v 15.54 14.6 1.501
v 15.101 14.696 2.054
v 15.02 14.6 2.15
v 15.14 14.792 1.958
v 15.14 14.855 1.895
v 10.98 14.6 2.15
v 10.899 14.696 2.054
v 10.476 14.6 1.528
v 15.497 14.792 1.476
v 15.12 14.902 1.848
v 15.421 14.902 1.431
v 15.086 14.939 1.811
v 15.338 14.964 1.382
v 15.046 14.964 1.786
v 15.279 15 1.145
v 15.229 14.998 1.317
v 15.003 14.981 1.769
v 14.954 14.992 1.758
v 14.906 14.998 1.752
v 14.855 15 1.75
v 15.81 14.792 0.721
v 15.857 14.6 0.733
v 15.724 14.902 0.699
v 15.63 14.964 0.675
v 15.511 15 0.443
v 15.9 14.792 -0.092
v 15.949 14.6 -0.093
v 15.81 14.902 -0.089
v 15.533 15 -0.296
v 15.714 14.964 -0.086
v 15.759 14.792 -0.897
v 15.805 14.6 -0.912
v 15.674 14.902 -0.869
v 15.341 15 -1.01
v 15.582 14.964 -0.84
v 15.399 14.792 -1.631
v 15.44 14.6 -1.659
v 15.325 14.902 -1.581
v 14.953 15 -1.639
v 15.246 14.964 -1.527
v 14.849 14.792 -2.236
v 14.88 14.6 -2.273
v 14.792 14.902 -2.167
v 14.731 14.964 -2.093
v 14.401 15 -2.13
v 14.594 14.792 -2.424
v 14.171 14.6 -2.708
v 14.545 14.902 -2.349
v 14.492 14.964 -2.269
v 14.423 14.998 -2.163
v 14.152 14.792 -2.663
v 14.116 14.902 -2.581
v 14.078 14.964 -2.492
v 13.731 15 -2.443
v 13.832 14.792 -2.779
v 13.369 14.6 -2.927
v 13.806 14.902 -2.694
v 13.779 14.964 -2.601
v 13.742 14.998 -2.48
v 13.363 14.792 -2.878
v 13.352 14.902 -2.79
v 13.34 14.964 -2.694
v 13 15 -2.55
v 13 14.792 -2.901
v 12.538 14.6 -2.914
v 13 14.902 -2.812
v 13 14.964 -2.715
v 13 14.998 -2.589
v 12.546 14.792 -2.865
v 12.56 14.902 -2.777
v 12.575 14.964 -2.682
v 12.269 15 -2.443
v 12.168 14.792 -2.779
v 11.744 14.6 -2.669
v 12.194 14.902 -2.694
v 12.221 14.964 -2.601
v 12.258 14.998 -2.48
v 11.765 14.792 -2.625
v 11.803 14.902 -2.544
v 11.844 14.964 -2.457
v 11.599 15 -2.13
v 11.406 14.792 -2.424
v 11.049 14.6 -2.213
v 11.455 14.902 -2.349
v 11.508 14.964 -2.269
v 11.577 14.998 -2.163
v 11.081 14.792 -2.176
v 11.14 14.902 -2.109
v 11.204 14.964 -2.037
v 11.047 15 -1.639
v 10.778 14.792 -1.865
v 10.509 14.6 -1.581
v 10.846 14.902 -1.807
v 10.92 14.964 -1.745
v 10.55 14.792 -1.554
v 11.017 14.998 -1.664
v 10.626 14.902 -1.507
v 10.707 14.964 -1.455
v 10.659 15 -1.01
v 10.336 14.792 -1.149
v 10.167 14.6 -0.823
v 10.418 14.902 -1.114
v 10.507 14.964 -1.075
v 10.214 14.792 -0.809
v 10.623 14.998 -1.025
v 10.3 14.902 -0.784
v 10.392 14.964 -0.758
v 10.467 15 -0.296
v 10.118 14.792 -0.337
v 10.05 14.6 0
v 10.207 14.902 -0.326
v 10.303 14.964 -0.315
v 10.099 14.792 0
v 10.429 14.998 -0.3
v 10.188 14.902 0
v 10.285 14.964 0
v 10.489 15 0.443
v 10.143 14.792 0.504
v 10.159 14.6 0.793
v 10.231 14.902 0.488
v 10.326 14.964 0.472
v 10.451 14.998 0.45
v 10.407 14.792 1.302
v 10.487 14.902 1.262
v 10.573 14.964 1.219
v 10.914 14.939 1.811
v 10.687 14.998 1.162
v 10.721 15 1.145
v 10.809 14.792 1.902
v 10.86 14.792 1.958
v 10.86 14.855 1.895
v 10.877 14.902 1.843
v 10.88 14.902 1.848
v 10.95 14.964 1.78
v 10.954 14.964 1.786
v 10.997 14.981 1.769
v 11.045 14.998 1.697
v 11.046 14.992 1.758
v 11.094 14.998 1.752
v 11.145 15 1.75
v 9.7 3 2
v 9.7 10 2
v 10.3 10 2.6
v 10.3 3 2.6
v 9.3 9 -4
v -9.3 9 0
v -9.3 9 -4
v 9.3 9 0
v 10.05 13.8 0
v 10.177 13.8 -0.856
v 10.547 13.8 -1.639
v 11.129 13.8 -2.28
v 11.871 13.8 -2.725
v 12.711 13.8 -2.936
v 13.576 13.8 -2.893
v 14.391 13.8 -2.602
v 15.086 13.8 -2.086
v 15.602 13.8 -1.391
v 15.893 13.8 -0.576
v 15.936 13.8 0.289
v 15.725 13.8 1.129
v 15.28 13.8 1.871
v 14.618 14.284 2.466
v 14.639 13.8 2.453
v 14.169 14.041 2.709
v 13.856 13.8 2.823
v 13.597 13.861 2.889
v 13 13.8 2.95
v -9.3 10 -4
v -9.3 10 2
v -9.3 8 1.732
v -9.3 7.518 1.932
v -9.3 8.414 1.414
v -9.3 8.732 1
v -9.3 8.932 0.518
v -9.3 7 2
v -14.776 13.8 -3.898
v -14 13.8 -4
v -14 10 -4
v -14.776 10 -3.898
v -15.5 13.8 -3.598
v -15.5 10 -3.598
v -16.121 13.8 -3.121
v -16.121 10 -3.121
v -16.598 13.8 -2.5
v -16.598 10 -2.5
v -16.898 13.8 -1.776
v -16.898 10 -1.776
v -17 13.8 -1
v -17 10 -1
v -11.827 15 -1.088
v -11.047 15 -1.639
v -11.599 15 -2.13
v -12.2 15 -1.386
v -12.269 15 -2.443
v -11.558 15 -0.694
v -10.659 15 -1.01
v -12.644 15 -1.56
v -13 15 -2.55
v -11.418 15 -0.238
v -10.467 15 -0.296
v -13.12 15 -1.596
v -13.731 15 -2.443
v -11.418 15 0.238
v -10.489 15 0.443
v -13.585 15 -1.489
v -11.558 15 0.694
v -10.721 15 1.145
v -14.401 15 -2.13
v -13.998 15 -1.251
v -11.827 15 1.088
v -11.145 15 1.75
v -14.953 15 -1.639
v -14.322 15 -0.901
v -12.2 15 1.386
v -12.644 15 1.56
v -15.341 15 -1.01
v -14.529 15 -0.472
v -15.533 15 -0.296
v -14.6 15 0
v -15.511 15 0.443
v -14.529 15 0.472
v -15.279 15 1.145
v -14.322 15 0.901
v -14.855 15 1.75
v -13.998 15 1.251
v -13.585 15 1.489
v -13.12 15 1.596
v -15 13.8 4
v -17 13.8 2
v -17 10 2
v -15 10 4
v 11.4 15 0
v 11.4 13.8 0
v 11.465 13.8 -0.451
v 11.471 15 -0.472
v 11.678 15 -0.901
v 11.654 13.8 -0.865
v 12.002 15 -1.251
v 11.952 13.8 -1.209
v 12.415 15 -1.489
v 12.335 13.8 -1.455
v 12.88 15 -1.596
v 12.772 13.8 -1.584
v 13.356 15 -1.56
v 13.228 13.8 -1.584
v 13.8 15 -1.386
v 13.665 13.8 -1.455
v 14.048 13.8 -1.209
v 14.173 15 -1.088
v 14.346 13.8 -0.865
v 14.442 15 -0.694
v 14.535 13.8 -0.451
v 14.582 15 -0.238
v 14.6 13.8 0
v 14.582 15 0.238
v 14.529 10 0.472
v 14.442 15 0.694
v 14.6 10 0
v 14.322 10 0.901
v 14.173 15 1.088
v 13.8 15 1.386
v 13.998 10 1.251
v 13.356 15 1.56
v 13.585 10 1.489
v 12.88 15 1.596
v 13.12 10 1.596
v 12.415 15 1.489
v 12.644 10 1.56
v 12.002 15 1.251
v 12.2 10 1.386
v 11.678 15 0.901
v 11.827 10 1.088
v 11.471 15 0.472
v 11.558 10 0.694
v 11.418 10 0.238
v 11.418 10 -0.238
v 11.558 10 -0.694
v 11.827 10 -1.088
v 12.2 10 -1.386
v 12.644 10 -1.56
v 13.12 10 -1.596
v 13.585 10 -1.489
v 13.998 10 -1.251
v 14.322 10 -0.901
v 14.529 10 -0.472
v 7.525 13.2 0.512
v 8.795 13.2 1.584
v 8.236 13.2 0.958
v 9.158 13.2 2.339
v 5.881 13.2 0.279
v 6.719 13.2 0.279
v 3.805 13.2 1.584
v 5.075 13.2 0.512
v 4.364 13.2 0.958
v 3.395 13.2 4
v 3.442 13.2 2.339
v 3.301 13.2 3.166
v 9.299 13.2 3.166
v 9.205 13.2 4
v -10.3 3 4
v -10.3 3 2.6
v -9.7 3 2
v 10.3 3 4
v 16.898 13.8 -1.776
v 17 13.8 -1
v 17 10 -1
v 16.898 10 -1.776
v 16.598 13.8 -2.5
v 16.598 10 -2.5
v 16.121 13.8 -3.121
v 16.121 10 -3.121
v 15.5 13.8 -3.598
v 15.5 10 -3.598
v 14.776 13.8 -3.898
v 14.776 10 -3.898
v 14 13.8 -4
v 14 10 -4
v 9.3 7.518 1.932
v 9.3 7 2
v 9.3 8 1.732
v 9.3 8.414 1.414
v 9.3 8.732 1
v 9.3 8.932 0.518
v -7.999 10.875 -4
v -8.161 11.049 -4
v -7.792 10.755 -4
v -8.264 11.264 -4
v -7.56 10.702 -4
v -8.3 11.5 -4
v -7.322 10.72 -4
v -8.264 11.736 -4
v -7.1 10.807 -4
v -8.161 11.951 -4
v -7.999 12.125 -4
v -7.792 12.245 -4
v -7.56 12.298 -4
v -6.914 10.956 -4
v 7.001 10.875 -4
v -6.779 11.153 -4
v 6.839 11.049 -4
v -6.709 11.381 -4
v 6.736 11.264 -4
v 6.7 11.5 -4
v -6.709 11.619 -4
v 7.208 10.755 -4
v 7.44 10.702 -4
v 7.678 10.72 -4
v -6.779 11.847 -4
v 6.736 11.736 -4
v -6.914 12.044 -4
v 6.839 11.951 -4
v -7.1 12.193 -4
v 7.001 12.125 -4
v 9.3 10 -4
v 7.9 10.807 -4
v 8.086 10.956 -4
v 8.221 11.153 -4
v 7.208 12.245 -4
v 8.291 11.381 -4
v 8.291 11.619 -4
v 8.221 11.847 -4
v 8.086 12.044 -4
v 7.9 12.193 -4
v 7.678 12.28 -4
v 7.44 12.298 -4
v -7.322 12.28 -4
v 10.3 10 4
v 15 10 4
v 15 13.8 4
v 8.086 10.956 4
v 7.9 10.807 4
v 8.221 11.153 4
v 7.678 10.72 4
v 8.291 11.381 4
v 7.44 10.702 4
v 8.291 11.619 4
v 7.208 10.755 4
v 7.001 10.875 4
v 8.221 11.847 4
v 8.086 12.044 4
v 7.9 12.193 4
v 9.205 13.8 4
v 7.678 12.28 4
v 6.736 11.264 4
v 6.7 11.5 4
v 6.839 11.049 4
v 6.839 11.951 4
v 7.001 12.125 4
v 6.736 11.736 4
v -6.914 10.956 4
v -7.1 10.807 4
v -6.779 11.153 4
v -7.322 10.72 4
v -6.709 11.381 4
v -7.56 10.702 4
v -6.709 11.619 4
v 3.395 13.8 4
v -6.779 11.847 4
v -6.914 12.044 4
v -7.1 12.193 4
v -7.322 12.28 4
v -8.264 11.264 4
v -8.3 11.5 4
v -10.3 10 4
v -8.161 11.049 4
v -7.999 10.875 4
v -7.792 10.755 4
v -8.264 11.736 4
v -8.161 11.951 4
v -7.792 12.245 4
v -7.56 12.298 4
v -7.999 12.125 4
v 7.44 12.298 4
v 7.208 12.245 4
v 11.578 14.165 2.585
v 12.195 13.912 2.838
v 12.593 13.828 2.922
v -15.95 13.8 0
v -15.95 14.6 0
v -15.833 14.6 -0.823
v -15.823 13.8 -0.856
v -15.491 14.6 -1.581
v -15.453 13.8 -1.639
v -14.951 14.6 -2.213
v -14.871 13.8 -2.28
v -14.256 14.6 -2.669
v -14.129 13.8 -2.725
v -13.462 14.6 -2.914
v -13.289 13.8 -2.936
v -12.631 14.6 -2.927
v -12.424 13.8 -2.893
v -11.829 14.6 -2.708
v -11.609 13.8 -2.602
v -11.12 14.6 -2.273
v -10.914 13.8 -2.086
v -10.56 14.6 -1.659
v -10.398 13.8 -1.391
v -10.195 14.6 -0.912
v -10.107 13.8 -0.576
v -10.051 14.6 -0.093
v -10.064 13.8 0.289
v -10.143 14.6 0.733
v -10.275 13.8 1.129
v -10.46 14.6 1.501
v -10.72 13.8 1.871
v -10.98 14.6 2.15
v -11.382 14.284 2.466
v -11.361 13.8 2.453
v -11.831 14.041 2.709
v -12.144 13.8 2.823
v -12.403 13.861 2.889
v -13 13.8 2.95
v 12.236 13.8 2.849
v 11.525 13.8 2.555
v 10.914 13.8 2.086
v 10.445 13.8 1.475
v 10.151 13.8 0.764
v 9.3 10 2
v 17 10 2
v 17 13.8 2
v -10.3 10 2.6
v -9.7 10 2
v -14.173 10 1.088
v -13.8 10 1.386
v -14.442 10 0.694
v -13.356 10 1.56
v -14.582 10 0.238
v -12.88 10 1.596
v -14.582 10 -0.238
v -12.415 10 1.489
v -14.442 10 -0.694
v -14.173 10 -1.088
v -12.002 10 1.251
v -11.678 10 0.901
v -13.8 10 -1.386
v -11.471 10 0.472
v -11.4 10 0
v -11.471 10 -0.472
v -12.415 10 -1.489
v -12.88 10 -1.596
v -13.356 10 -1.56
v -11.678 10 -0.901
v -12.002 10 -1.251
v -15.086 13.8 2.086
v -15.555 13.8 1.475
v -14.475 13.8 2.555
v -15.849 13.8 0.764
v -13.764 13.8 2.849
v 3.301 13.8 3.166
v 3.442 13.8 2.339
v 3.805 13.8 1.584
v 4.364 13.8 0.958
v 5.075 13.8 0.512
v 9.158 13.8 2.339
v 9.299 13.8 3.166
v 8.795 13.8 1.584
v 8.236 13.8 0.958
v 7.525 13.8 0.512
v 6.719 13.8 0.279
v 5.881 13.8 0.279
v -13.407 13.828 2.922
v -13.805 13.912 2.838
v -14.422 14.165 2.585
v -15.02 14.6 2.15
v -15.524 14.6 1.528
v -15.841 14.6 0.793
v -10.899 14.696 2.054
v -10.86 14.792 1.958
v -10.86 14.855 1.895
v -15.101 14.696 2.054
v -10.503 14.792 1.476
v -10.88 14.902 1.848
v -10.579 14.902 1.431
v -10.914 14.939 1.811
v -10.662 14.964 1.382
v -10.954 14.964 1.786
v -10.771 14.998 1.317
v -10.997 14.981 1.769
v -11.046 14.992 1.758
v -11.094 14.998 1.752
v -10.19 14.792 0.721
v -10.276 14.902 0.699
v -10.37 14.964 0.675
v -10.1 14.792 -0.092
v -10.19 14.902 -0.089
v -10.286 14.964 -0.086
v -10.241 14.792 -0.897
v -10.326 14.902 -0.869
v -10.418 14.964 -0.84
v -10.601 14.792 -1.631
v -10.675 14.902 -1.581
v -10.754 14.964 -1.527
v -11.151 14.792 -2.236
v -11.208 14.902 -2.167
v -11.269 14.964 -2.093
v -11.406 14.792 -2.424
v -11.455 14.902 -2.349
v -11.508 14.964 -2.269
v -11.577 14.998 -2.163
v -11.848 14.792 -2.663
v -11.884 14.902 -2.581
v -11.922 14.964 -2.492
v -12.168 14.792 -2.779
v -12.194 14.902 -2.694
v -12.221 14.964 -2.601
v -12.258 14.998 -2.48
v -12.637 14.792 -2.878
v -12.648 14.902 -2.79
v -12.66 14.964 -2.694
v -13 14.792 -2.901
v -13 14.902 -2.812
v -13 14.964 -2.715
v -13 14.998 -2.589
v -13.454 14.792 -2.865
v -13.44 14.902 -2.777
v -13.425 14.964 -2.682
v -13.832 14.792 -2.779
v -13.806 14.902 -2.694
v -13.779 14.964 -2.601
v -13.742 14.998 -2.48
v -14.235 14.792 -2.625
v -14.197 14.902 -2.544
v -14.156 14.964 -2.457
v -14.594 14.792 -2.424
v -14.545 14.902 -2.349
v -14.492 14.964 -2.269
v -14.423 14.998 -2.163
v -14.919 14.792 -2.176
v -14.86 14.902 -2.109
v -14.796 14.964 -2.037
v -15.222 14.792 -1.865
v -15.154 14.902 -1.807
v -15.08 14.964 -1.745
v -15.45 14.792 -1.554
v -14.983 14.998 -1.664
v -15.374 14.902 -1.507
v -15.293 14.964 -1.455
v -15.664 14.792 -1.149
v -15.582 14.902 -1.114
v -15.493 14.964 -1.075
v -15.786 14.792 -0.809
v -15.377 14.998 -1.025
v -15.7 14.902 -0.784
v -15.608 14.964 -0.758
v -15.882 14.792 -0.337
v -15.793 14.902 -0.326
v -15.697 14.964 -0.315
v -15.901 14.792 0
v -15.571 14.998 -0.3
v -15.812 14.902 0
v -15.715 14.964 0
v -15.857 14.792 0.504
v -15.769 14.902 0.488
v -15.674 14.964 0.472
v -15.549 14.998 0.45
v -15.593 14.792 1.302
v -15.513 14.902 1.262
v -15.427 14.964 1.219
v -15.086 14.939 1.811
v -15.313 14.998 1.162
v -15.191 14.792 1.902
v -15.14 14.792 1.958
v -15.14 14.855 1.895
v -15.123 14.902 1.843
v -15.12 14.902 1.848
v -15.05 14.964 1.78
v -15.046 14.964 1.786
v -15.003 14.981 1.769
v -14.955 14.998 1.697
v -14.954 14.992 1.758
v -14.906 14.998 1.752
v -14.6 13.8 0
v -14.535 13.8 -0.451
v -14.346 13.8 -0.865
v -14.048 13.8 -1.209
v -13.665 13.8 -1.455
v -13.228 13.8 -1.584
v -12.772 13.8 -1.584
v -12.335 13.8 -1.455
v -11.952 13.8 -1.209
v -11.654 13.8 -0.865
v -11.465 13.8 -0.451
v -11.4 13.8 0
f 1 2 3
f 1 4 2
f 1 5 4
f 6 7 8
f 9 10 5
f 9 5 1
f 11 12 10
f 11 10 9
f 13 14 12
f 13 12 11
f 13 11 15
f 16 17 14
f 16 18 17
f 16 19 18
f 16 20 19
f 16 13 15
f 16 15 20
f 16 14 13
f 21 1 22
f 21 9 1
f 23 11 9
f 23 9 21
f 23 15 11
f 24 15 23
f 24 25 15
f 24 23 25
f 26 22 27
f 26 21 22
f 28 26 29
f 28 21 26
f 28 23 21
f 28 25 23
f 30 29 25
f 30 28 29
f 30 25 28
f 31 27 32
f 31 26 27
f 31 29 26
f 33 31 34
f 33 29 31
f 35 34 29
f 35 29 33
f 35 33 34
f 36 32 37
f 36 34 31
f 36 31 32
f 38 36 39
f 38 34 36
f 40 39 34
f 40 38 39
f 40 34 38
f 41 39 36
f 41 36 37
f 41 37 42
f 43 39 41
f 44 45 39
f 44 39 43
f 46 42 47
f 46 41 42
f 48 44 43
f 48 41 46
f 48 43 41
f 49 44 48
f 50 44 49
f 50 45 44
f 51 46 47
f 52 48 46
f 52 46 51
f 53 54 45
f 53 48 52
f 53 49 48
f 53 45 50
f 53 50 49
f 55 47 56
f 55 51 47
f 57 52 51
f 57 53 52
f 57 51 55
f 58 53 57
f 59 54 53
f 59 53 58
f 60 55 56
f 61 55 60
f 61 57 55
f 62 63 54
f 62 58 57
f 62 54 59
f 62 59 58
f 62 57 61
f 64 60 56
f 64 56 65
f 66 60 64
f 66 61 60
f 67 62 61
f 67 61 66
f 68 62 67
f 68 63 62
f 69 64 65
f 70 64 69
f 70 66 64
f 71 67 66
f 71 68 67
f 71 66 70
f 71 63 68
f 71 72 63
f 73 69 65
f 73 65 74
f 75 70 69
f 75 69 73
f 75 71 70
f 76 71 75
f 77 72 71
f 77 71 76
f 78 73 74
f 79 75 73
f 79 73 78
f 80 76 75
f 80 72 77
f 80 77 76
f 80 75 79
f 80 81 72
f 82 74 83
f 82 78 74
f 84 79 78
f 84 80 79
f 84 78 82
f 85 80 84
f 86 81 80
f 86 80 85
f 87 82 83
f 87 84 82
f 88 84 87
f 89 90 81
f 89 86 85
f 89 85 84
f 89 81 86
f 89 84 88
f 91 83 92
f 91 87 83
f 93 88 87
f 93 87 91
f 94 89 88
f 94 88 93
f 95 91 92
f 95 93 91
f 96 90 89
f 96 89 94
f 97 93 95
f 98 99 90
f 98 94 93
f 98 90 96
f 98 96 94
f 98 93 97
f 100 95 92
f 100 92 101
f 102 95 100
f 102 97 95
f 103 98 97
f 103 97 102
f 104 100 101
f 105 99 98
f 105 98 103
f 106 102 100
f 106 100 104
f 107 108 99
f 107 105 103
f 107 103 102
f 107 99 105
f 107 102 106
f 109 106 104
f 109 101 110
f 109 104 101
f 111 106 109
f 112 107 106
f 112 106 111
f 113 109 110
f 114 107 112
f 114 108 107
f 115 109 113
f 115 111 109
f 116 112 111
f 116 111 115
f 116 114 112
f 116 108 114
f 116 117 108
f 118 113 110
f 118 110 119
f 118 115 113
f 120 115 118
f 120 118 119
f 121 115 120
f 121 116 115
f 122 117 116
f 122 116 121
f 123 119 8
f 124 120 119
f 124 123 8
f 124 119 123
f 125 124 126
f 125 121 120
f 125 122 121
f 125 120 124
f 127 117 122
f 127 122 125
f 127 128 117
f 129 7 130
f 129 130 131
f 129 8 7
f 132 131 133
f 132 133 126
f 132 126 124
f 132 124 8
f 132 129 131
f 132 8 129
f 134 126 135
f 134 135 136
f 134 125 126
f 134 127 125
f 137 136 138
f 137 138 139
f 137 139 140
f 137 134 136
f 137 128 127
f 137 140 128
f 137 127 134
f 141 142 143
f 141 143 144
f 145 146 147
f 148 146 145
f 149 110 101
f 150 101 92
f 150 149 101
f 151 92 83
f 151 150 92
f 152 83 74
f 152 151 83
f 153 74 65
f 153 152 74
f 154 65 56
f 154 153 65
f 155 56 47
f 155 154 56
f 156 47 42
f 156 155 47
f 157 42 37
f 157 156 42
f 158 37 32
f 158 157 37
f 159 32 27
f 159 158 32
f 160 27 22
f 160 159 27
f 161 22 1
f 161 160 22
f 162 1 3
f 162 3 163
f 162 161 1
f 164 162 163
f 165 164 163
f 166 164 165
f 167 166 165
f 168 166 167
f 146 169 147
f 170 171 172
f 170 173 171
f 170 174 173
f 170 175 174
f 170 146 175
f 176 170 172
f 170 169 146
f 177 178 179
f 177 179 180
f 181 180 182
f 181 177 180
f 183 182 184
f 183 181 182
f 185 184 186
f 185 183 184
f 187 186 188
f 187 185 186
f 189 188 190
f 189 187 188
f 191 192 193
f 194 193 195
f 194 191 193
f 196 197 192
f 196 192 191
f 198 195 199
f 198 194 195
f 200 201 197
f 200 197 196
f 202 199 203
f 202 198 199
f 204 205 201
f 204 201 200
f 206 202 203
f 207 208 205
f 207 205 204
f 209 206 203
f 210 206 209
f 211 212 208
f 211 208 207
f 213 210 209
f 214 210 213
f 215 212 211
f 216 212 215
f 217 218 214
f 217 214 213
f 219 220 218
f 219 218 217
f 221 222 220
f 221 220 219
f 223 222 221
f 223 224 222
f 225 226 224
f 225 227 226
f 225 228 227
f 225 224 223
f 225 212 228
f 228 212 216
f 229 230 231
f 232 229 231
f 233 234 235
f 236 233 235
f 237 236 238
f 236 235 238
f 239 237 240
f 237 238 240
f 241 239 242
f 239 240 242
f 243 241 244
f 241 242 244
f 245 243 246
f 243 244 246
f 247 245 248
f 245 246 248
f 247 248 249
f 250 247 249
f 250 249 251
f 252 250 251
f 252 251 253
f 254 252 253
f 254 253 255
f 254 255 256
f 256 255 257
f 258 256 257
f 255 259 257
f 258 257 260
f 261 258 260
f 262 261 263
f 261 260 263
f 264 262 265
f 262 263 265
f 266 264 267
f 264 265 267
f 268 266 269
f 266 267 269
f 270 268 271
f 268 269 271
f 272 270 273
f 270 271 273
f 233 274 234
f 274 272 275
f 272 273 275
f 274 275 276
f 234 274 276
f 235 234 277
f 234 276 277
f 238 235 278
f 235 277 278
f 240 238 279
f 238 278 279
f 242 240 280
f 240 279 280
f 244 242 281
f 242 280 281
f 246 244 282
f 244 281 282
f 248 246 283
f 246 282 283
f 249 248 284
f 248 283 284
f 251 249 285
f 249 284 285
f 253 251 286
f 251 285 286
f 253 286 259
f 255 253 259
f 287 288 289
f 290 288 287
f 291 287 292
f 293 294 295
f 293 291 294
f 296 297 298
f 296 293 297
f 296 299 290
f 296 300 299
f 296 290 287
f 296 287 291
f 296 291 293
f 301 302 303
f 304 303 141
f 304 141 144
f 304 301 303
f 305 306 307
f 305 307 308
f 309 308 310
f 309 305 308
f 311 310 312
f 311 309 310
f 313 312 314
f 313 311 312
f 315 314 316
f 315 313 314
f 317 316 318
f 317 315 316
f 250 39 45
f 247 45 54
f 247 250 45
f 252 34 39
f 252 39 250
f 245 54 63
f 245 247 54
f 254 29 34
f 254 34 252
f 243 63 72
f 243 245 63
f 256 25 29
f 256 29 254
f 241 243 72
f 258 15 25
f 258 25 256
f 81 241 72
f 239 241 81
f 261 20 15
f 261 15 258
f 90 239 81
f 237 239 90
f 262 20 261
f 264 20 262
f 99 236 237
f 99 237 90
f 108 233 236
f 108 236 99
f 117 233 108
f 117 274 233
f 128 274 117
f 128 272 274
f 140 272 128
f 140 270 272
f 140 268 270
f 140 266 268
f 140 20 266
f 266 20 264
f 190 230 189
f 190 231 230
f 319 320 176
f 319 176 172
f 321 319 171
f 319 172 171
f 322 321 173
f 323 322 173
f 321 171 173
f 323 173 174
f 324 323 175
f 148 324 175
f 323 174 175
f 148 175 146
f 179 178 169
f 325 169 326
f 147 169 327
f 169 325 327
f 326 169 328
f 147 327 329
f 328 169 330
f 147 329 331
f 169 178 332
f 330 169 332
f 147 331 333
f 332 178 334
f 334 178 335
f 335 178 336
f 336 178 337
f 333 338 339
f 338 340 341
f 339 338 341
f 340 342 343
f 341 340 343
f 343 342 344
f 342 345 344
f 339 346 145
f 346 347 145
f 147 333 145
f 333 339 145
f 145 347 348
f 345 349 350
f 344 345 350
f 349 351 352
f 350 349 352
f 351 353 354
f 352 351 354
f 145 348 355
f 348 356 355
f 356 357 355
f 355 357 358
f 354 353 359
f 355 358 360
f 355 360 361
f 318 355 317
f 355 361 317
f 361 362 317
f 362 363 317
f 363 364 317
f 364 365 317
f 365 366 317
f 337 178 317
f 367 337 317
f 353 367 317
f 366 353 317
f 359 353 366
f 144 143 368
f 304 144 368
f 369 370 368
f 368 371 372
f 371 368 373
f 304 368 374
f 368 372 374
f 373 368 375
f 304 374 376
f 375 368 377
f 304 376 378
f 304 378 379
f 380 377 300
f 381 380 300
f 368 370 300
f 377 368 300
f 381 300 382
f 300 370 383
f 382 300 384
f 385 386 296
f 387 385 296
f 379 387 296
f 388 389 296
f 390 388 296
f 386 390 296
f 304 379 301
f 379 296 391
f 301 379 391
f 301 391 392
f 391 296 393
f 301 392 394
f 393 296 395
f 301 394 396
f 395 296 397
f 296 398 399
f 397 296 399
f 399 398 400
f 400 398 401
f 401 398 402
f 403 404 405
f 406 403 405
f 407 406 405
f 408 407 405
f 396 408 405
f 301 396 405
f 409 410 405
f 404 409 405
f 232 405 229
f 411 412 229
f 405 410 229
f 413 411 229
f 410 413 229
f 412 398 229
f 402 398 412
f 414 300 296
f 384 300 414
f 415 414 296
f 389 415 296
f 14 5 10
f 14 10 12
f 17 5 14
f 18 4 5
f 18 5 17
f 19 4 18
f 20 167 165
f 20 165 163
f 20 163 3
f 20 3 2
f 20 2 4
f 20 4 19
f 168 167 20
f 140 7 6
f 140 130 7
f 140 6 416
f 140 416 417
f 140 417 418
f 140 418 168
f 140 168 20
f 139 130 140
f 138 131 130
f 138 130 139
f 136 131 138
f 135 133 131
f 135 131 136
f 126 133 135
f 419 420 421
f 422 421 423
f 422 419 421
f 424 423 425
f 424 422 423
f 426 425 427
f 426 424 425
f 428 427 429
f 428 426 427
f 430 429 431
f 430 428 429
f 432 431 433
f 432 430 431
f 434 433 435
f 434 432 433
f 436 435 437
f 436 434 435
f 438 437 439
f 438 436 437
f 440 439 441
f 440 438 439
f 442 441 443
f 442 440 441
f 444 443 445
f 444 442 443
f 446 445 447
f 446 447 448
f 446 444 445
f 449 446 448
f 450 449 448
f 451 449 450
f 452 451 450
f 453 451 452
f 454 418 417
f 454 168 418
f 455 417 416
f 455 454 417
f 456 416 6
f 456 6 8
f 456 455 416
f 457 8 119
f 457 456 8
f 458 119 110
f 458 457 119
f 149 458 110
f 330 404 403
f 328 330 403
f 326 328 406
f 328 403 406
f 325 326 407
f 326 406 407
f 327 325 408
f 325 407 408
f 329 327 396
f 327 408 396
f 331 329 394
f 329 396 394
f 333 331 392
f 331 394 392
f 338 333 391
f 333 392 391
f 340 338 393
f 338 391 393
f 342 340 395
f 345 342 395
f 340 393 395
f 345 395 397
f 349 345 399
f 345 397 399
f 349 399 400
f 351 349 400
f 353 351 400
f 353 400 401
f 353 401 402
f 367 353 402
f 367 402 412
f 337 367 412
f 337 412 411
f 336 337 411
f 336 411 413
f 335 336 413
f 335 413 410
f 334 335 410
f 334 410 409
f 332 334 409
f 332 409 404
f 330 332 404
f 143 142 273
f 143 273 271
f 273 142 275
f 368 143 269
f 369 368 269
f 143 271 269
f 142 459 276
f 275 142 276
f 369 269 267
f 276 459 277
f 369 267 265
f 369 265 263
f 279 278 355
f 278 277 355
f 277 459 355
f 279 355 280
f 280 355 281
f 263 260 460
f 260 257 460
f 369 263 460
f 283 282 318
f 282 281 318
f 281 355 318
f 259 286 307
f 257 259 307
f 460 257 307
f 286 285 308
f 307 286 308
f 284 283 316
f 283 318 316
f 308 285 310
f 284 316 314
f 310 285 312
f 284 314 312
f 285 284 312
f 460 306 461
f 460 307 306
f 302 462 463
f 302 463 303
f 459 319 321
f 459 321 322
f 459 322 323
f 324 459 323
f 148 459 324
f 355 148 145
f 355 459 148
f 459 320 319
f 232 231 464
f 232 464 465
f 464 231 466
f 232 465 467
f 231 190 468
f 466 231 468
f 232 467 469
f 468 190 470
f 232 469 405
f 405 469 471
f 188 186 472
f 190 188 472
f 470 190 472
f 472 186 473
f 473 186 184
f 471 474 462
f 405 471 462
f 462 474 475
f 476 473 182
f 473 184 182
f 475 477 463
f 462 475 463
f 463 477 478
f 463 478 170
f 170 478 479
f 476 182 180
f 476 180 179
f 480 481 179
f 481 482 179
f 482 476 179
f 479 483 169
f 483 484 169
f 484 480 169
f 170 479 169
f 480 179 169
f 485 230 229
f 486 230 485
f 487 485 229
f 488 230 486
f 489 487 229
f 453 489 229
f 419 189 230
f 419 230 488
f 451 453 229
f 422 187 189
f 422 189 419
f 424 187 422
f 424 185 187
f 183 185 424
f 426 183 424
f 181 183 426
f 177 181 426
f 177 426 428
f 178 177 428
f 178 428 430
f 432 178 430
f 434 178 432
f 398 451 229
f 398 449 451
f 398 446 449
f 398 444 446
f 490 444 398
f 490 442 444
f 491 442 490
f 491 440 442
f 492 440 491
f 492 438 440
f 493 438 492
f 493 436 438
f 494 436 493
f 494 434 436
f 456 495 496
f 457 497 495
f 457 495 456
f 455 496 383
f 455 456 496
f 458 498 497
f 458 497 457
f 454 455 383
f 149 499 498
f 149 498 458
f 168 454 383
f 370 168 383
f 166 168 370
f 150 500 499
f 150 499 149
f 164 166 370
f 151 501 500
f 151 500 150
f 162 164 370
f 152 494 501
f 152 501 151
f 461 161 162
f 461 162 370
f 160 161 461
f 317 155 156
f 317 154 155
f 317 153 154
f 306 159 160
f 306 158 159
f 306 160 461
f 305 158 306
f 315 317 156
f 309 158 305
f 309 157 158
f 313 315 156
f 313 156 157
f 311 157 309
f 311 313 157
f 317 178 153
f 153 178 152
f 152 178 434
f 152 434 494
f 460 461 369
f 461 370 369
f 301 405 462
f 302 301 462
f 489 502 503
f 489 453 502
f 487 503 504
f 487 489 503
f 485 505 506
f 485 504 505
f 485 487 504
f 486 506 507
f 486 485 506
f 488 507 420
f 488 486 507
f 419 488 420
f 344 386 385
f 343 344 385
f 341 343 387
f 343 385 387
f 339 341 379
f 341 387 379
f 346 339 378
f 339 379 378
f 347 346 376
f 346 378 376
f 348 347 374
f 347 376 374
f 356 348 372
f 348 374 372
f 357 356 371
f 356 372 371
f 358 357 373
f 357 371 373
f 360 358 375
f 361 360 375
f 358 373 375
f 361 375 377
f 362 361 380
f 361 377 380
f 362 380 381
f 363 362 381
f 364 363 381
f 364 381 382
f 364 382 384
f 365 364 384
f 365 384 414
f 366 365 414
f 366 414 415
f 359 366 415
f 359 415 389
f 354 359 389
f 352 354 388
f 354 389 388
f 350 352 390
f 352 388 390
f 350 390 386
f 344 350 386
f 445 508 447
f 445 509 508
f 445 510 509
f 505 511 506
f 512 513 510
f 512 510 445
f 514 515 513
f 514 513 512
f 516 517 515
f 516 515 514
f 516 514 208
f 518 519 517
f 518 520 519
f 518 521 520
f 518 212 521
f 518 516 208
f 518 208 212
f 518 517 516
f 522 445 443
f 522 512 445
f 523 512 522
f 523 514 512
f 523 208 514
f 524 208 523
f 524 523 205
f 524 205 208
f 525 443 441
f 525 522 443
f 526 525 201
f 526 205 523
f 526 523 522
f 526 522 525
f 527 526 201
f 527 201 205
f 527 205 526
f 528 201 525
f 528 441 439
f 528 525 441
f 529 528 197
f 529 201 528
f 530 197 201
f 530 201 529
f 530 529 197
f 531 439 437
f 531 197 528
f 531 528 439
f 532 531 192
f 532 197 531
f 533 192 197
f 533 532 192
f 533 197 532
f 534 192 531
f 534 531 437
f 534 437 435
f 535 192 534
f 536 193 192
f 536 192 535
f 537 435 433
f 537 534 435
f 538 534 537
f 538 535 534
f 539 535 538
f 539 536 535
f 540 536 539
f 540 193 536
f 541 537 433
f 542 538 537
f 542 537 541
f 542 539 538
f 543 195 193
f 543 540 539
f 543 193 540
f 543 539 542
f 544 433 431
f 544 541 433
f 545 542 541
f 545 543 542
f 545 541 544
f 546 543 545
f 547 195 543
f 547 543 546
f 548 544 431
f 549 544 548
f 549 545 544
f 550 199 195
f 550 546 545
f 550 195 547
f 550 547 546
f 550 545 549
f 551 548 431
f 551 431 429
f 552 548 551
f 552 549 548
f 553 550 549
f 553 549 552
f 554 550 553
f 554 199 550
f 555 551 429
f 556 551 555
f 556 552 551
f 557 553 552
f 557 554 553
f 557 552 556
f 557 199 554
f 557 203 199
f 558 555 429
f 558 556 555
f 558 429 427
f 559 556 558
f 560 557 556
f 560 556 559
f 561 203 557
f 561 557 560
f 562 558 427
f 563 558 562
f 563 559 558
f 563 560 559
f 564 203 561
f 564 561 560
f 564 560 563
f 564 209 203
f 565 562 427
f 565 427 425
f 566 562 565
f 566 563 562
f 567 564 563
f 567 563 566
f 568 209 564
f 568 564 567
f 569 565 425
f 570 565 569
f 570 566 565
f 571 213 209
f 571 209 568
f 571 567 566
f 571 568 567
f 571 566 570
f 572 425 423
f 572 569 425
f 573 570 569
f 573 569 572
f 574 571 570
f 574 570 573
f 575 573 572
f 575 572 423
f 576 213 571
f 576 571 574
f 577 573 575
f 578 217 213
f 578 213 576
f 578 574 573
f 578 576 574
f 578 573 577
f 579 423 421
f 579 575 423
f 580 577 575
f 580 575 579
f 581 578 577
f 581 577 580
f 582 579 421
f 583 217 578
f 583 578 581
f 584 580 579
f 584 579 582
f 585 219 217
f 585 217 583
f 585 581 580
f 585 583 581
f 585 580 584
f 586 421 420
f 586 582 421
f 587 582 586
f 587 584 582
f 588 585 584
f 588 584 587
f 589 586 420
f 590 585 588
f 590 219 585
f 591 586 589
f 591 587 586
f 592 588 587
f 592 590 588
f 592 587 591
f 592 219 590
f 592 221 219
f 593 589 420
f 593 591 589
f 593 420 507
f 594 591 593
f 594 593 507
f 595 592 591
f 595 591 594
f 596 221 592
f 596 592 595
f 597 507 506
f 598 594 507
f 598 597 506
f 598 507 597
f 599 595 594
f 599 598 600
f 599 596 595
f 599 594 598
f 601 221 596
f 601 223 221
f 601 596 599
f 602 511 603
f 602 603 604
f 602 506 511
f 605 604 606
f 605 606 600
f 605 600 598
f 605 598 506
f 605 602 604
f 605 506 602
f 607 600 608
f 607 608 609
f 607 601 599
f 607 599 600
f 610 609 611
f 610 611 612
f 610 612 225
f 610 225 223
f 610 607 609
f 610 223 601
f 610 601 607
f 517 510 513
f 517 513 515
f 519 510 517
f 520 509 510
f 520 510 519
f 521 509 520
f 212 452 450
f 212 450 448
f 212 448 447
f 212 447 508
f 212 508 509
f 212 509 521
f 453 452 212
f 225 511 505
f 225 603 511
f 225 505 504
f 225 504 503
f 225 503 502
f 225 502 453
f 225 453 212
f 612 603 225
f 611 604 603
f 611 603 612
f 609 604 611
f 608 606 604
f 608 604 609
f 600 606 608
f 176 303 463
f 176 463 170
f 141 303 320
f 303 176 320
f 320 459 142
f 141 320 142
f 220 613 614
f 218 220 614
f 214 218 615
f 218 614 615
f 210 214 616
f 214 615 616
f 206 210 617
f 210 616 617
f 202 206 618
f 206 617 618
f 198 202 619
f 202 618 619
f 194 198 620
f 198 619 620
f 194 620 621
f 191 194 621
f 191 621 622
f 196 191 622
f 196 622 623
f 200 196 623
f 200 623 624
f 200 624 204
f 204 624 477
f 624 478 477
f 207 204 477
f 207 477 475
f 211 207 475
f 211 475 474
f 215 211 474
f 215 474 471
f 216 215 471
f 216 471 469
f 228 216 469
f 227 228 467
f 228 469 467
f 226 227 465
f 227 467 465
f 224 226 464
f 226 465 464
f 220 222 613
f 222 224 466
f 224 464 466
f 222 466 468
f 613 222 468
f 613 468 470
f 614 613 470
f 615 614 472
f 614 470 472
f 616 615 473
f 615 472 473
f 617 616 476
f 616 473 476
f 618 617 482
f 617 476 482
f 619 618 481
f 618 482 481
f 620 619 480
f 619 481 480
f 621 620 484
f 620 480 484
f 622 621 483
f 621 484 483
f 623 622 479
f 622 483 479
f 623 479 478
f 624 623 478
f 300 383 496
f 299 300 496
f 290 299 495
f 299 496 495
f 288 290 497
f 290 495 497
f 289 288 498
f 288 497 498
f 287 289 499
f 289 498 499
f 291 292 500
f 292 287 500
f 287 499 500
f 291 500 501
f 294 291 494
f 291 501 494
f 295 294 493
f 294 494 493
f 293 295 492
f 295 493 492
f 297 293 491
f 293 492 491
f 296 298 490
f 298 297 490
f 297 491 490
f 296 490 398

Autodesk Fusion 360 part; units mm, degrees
sketch "Sketch1" plane through (0, 0, 0) normal (0, 1, 0) x (1, 0, 0)
  line L0 (17, -4) -> (-17, -4)
  line L1 (-17, -4) -> (-17, 4)
  line L2 (-17, 4) -> (17, 4)
  line L3 (17, 4) -> (17, -4)
  line L4 (17, -4) -> (-17, 4) construction
  line L5 (-17, -4) -> (17, 4) construction
  circle A0 centre (-13, 0) radius 1.6
  circle A1 centre (13, 0) radius 1.6
  line L6 (-13, 0) -> (0, 0) construction
  line L7 (0, 0) -> (13, 0) construction
  dimension "d1" = 26
  dimension "d2" = 3.2
  dimension "d3" = 34
  dimension "d4" = 8
extrude "Extrude1" add sketch "Sketch1" along normal blind 13.8
sketch "Sketch3" plane through (0, 0, 4) normal (0, 0, 1) x (-1, 0, 0)
  line L0 (17, 0) -> (-17, 0)
  line L1 (-17, 0) -> (-17, -13.8)
  line L2 (-17, -13.8) -> (17, -13.8)
  line L3 (17, -13.8) -> (17, 0)
  line L4 (0, 0) -> (0, -13.8) construction
  line L5 (0, -11.5) -> (-7.5, -11.5) construction
  line L6 (0, -11.5) -> (7.5, -11.5) construction
  circle A0 centre (7.5, -11.5) radius 0.8
  circle A1 centre (-7.5, -11.5) radius 0.8
  dimension "d7" = 15
  dimension "d8" = 1.6
  dimension "d9" = 2.3
extrude "Extrude2" cut sketch "Sketch3" against normal through all contours A0 | A1
sketch "Sketch5" plane through (0, 13.8, 0) normal (0, 1, 0) x (-1, 0, 0)
  circle A0 centre (-13, 0) radius 1.6
  circle A1 centre (13, 0) radius 1.6
  line L0 (-17, -4) -> (17, -4)
  line L1 (17, -4) -> (17, 4)
  line L2 (17, 4) -> (-17, 4)
  line L3 (-17, 4) -> (-17, -4)
  circle A2 centre (-13, 0) radius 2.95
  circle A3 centre (13, 0) radius 2.95
  dimension "d11" = 5.9
extrude "Extrude3" add sketch "Sketch5" along normal blind 1.2 contours A2 | A3
fillet "Fillet1" radius 0.4 2 edges at (15.7504, 15, -1.0668) (-10.2496, 15, -1.0668)
extrude "Extrude4" cut 1 faces at (4.1385, 0, 3.1631) along direction (0, 1, 0) blind 10
sketch "Sketch7" plane through (0, 10, 0) normal (0, -1, 0) x (1, 0, 0)
  circle A0 centre (13, 0) radius 1.6
  circle A1 centre (-13, 0) radius 1.6
  line L0 (-17, -4) -> (17, -4)
  line L1 (17, -4) -> (17, 4)
  line L2 (17, 4) -> (-17, 4)
  line L3 (-17, 4) -> (-17, -4)
  circle A2 centre (-13, 0) radius 3
  circle A3 centre (13, 0) radius 3
  line L4 (-10.3, 4) -> (10.3, 4)
  line L5 (10.3, 4) -> (10.3, 2)
  line L6 (10.3, 2) -> (-10.3, 2)
  line L7 (-10.3, 2) -> (-10.3, 4)
  line L8 (-8.3, 4) -> (-6.7, 4)
  line L9 (6.7, 4) -> (8.3, 4)
  line L10 (-9.3, 2) -> (9.3, 2)
  line L11 (9.3, 2) -> (9.3, -4)
  line L12 (9.3, -4) -> (-9.3, -4)
  line L13 (-9.3, -4) -> (-9.3, 2)
  dimension "d20" = 6
  dimension "d21" = 6
  dimension "d22" = 2
  dimension "d23" = 2
  dimension "d24" = 2
  dimension "d25" = 1
  dimension "d26" = 1
extrude "Extrude5" add sketch "Sketch7" along normal blind 1 contours L0 L6 L10 L11 L12 L13 | L2 L4 L5 L6 L7 L8 L9 L10
sketch "Sketch8" plane through (0, 9, 0) normal (0, -1, 0) x (1, 0, 0)
  line L0 (-9.3, -4) -> (9.3, -4)
  line L1 (9.3, -4) -> (9.3, 2)
  line L2 (9.3, 2) -> (10.3, 2)
  line L3 (10.3, 2) -> (10.3, 4)
  line L4 (10.3, 4) -> (-10.3, 4)
  line L5 (-10.3, 4) -> (-10.3, 2)
  line L6 (-10.3, 2) -> (-9.3, 2)
  line L7 (-9.3, 2) -> (-9.3, -4)
  line L8 (-10.3, 4) -> (10.3, 4)
  line L9 (10.3, 4) -> (10.3, 2)
  line L10 (10.3, 2) -> (-10.3, 2)
  line L11 (-10.3, 2) -> (-10.3, 4)
extrude "Extrude6" add sketch "Sketch8" along normal blind 6 contours L2 L3 L4 L5 L6 L8 L9 L10 L11
fillet "Fillet3" radius 2 1 edges at (0, 9, 2)
fillet "Fillet4" radius 3 2 edges at (17, 11.9, -4) (-17, 11.9, -4)
chamfer "Chamfer1" distance 2 angle 45 2 edges at (-17, 11.9, 4) (17, 11.9, 4)
sketch "Sketch9" plane through (-17, 0, 0) normal (-1, 0, 0) x (0, -1, 0)
  line L0 (-10, 2) -> (-13.8, 2)
  line L1 (-13.8, 2) -> (-13.8, -1)
  line L2 (-13.8, -1) -> (-10, -1)
  line L3 (-10, -1) -> (-10, 2)
  line L4 (-13.8, -2.95) -> (-13.8, 2.95)
  line L5 (-14.6, 2.95) -> (-14.6, -2.95) construction
  line L6 (-15, -2.55) -> (-15, 2.55)
  line L7 (-13.8, 2.95) -> (-15, 1.75)
  line L8 (-13.8, 2.95) -> (-15, 2.95)
  line L9 (-15, 1.75) -> (-15, 2.95)
  dimension "d36" = 45
extrude "Extrude7" cut sketch "Sketch9" against normal through all contours L6 L7 L8 L9
chamfer "Chamfer2" distance 0.6 angle 45 2 edges at (-10.3, 6.5, 2) (10.3, 6.5, 2)
sketch "Sketch10" plane through (0, 13.8, 0) normal (0, 1, 0) x (-1, 0, 0)
  line L0 (-15, 4) -> (-17, 2)
  line L1 (-17, 2) -> (-17, -1)
  arc A0 (-17, -1) -> (-14, -4) centre (-14, -1) ccw
  line L2 (-14, -4) -> (14, -4)
  arc A1 (14, -4) -> (17, -1) centre (14, -1) ccw
  line L3 (17, -1) -> (17, 2)
  line L4 (17, 2) -> (15, 4)
  line L5 (15, 4) -> (-15, 4)
  circle A2 centre (-13, 0) radius 2.95
  circle A3 centre (13, 0) radius 2.95
  line L6 (-13, 0) -> (-6.3, 0) construction
  line L7 (-6.3, 0) -> (-6.3, 3.25) construction
  circle A4 centre (-6.3, 3.25) radius 3
  dimension "d39" = 6.7
  dimension "d40" = 3.25
  dimension "d41" = 6
extrude "Extrude8" cut sketch "Sketch10" against normal blind 0.6 contours L5 A4 picked at (-5.5354, 2.496)
